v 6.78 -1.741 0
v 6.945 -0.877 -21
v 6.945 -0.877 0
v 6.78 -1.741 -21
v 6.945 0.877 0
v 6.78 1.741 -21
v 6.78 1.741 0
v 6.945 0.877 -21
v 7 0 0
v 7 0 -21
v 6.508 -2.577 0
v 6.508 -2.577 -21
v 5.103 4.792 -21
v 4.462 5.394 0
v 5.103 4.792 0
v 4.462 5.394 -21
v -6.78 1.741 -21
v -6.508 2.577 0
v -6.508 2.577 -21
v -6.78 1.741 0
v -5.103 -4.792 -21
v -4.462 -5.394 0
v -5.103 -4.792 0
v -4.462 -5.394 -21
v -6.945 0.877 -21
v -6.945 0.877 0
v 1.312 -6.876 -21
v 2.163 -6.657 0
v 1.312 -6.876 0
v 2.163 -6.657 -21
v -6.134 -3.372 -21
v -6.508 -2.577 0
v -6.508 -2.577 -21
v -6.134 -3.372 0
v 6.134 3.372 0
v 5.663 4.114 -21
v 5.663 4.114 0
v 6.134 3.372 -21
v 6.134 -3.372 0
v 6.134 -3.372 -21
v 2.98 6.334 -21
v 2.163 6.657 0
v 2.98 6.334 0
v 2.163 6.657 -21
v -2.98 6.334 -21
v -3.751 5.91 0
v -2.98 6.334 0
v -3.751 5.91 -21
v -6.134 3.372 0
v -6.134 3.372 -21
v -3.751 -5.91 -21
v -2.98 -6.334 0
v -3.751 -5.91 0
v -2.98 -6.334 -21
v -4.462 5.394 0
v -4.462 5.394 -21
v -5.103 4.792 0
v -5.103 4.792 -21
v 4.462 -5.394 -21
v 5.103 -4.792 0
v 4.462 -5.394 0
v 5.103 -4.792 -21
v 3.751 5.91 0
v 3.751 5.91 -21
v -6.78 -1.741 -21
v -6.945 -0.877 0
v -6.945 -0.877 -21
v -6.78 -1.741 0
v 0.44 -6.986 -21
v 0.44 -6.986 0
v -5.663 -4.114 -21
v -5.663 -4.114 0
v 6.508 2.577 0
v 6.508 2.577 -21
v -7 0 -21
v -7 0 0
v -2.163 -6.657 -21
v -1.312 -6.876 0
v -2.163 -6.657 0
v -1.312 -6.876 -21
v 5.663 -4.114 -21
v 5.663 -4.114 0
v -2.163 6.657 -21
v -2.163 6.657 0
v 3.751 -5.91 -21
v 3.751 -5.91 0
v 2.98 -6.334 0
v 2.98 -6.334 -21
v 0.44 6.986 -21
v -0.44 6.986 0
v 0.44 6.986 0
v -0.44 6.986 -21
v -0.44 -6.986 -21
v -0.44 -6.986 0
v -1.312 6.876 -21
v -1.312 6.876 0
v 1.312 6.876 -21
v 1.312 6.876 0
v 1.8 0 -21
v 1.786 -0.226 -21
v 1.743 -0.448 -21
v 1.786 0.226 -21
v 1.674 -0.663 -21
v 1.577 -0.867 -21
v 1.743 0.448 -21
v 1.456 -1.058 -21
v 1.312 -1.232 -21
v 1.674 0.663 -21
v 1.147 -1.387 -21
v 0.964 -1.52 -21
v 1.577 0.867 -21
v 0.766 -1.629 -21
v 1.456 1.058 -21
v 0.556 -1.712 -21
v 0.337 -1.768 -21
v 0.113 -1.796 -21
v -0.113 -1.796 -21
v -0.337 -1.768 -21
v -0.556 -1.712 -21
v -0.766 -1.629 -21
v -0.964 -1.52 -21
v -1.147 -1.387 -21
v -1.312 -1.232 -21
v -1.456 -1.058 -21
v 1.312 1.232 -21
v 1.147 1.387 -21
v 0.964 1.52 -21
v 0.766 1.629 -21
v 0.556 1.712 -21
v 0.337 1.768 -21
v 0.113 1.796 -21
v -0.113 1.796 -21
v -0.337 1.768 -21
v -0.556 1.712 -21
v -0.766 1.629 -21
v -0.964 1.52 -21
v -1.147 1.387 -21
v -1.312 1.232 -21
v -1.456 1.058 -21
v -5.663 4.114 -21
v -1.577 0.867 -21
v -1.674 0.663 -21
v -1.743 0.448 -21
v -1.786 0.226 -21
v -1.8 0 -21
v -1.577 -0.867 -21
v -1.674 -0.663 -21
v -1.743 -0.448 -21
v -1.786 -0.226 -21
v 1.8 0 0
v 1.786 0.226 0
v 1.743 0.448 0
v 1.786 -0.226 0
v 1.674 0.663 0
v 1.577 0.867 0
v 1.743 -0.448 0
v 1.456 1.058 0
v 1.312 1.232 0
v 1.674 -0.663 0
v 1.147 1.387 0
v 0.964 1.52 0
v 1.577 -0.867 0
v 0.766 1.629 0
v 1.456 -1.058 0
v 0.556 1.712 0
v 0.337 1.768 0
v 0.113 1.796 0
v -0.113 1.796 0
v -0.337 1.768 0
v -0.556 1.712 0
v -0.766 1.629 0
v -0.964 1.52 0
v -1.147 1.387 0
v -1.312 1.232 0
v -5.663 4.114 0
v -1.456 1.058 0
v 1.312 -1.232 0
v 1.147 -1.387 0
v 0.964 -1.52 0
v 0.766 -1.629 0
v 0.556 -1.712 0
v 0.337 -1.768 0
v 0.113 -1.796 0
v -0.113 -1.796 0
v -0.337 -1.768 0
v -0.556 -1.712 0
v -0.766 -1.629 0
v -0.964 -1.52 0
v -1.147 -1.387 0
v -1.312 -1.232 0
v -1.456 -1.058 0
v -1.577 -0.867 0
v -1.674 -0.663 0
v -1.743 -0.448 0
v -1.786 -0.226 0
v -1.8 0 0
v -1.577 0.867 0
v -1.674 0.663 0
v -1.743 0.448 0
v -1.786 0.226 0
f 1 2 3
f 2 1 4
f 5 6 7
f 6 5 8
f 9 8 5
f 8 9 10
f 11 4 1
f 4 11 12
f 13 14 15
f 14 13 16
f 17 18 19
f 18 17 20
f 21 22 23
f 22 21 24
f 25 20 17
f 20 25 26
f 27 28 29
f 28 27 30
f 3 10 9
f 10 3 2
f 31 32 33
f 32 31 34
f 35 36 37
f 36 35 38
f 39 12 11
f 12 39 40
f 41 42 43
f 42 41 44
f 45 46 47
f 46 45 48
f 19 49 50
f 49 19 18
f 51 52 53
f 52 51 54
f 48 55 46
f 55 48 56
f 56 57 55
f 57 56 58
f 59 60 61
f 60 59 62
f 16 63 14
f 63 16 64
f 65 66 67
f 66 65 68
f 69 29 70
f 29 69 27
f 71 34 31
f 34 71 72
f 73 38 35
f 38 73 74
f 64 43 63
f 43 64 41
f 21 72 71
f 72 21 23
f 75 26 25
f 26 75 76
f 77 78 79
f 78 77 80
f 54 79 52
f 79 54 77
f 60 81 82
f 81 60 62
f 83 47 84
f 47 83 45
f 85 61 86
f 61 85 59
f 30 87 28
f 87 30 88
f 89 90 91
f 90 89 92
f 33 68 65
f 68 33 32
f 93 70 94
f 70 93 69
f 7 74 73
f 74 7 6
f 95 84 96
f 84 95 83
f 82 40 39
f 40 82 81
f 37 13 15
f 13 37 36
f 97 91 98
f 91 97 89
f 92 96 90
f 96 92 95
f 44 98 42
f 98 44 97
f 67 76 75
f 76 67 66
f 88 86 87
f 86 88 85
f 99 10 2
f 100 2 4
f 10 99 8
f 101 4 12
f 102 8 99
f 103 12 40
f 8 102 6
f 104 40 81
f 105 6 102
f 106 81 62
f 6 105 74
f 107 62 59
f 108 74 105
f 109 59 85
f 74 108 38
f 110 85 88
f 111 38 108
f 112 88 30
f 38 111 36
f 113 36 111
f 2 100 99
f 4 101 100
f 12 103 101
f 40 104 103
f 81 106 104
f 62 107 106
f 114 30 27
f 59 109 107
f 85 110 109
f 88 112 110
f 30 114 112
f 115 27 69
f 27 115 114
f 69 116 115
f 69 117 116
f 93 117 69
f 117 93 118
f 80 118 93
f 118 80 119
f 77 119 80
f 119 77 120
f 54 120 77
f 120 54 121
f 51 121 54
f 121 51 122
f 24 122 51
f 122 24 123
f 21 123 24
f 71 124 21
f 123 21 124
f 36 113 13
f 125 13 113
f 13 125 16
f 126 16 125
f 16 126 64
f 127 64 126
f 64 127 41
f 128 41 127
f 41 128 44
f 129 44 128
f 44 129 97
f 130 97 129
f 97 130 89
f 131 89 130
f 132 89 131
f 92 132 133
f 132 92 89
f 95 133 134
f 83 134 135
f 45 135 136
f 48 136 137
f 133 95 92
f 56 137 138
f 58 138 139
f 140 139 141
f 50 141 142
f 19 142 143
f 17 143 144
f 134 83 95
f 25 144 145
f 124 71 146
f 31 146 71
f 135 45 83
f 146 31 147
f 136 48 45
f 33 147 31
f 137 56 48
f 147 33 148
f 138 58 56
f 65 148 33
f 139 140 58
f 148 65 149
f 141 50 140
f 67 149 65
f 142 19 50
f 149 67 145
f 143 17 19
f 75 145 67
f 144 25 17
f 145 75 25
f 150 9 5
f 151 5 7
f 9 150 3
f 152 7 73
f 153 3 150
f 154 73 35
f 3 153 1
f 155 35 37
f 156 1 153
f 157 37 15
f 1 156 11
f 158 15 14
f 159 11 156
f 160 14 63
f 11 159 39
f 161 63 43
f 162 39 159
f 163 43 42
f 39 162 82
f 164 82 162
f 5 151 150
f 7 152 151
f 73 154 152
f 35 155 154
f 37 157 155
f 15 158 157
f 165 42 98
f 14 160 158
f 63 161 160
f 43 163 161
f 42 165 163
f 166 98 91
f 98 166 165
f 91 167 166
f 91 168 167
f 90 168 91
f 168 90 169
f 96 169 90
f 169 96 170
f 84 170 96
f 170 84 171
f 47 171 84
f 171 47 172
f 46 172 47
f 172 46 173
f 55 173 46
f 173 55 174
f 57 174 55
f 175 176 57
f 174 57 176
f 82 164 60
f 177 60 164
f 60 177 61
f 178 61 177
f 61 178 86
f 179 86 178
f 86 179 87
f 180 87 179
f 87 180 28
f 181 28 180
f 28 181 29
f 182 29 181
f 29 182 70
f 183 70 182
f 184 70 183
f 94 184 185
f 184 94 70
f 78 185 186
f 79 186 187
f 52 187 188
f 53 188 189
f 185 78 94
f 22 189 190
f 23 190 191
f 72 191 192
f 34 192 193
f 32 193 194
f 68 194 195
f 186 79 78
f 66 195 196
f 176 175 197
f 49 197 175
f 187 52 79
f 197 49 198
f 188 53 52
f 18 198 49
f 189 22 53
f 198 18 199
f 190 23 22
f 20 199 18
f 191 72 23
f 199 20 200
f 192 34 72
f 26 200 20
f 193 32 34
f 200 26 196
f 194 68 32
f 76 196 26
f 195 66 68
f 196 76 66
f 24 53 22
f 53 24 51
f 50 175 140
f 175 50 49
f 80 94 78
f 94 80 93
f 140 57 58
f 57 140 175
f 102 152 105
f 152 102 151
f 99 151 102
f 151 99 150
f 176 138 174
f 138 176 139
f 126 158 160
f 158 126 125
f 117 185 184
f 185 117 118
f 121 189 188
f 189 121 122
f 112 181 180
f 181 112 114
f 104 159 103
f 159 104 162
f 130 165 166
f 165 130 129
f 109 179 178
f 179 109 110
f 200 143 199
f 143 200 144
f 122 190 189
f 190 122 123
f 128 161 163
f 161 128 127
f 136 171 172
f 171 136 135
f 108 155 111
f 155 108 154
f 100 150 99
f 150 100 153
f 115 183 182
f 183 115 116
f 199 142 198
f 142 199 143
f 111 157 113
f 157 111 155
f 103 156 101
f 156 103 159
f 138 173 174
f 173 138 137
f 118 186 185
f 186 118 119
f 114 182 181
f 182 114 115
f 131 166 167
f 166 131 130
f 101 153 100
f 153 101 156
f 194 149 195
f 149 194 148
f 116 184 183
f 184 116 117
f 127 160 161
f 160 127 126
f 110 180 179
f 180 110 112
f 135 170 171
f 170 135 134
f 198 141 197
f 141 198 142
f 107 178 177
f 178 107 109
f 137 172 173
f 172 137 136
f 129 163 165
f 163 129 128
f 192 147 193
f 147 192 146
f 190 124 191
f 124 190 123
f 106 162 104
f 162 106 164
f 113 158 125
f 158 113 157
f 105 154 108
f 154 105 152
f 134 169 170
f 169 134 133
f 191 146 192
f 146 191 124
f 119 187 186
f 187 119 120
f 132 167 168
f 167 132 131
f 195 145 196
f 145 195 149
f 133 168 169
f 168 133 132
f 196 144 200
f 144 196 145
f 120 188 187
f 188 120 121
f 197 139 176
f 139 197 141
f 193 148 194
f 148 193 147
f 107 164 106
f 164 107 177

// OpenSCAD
$fn = 50;


difference() {
	union() {
		translate(v = [0, 0, -21.0000000000]) {
			cylinder(h = 21, r = 7.0000000000);
		}
		cylinder(h = 0, r = 16.0000000000);
	}
	union() {
		#translate(v = [0, 0, -21]) {
			cylinder(h = 21, r = 1.8000000000);
		}
	}
}
